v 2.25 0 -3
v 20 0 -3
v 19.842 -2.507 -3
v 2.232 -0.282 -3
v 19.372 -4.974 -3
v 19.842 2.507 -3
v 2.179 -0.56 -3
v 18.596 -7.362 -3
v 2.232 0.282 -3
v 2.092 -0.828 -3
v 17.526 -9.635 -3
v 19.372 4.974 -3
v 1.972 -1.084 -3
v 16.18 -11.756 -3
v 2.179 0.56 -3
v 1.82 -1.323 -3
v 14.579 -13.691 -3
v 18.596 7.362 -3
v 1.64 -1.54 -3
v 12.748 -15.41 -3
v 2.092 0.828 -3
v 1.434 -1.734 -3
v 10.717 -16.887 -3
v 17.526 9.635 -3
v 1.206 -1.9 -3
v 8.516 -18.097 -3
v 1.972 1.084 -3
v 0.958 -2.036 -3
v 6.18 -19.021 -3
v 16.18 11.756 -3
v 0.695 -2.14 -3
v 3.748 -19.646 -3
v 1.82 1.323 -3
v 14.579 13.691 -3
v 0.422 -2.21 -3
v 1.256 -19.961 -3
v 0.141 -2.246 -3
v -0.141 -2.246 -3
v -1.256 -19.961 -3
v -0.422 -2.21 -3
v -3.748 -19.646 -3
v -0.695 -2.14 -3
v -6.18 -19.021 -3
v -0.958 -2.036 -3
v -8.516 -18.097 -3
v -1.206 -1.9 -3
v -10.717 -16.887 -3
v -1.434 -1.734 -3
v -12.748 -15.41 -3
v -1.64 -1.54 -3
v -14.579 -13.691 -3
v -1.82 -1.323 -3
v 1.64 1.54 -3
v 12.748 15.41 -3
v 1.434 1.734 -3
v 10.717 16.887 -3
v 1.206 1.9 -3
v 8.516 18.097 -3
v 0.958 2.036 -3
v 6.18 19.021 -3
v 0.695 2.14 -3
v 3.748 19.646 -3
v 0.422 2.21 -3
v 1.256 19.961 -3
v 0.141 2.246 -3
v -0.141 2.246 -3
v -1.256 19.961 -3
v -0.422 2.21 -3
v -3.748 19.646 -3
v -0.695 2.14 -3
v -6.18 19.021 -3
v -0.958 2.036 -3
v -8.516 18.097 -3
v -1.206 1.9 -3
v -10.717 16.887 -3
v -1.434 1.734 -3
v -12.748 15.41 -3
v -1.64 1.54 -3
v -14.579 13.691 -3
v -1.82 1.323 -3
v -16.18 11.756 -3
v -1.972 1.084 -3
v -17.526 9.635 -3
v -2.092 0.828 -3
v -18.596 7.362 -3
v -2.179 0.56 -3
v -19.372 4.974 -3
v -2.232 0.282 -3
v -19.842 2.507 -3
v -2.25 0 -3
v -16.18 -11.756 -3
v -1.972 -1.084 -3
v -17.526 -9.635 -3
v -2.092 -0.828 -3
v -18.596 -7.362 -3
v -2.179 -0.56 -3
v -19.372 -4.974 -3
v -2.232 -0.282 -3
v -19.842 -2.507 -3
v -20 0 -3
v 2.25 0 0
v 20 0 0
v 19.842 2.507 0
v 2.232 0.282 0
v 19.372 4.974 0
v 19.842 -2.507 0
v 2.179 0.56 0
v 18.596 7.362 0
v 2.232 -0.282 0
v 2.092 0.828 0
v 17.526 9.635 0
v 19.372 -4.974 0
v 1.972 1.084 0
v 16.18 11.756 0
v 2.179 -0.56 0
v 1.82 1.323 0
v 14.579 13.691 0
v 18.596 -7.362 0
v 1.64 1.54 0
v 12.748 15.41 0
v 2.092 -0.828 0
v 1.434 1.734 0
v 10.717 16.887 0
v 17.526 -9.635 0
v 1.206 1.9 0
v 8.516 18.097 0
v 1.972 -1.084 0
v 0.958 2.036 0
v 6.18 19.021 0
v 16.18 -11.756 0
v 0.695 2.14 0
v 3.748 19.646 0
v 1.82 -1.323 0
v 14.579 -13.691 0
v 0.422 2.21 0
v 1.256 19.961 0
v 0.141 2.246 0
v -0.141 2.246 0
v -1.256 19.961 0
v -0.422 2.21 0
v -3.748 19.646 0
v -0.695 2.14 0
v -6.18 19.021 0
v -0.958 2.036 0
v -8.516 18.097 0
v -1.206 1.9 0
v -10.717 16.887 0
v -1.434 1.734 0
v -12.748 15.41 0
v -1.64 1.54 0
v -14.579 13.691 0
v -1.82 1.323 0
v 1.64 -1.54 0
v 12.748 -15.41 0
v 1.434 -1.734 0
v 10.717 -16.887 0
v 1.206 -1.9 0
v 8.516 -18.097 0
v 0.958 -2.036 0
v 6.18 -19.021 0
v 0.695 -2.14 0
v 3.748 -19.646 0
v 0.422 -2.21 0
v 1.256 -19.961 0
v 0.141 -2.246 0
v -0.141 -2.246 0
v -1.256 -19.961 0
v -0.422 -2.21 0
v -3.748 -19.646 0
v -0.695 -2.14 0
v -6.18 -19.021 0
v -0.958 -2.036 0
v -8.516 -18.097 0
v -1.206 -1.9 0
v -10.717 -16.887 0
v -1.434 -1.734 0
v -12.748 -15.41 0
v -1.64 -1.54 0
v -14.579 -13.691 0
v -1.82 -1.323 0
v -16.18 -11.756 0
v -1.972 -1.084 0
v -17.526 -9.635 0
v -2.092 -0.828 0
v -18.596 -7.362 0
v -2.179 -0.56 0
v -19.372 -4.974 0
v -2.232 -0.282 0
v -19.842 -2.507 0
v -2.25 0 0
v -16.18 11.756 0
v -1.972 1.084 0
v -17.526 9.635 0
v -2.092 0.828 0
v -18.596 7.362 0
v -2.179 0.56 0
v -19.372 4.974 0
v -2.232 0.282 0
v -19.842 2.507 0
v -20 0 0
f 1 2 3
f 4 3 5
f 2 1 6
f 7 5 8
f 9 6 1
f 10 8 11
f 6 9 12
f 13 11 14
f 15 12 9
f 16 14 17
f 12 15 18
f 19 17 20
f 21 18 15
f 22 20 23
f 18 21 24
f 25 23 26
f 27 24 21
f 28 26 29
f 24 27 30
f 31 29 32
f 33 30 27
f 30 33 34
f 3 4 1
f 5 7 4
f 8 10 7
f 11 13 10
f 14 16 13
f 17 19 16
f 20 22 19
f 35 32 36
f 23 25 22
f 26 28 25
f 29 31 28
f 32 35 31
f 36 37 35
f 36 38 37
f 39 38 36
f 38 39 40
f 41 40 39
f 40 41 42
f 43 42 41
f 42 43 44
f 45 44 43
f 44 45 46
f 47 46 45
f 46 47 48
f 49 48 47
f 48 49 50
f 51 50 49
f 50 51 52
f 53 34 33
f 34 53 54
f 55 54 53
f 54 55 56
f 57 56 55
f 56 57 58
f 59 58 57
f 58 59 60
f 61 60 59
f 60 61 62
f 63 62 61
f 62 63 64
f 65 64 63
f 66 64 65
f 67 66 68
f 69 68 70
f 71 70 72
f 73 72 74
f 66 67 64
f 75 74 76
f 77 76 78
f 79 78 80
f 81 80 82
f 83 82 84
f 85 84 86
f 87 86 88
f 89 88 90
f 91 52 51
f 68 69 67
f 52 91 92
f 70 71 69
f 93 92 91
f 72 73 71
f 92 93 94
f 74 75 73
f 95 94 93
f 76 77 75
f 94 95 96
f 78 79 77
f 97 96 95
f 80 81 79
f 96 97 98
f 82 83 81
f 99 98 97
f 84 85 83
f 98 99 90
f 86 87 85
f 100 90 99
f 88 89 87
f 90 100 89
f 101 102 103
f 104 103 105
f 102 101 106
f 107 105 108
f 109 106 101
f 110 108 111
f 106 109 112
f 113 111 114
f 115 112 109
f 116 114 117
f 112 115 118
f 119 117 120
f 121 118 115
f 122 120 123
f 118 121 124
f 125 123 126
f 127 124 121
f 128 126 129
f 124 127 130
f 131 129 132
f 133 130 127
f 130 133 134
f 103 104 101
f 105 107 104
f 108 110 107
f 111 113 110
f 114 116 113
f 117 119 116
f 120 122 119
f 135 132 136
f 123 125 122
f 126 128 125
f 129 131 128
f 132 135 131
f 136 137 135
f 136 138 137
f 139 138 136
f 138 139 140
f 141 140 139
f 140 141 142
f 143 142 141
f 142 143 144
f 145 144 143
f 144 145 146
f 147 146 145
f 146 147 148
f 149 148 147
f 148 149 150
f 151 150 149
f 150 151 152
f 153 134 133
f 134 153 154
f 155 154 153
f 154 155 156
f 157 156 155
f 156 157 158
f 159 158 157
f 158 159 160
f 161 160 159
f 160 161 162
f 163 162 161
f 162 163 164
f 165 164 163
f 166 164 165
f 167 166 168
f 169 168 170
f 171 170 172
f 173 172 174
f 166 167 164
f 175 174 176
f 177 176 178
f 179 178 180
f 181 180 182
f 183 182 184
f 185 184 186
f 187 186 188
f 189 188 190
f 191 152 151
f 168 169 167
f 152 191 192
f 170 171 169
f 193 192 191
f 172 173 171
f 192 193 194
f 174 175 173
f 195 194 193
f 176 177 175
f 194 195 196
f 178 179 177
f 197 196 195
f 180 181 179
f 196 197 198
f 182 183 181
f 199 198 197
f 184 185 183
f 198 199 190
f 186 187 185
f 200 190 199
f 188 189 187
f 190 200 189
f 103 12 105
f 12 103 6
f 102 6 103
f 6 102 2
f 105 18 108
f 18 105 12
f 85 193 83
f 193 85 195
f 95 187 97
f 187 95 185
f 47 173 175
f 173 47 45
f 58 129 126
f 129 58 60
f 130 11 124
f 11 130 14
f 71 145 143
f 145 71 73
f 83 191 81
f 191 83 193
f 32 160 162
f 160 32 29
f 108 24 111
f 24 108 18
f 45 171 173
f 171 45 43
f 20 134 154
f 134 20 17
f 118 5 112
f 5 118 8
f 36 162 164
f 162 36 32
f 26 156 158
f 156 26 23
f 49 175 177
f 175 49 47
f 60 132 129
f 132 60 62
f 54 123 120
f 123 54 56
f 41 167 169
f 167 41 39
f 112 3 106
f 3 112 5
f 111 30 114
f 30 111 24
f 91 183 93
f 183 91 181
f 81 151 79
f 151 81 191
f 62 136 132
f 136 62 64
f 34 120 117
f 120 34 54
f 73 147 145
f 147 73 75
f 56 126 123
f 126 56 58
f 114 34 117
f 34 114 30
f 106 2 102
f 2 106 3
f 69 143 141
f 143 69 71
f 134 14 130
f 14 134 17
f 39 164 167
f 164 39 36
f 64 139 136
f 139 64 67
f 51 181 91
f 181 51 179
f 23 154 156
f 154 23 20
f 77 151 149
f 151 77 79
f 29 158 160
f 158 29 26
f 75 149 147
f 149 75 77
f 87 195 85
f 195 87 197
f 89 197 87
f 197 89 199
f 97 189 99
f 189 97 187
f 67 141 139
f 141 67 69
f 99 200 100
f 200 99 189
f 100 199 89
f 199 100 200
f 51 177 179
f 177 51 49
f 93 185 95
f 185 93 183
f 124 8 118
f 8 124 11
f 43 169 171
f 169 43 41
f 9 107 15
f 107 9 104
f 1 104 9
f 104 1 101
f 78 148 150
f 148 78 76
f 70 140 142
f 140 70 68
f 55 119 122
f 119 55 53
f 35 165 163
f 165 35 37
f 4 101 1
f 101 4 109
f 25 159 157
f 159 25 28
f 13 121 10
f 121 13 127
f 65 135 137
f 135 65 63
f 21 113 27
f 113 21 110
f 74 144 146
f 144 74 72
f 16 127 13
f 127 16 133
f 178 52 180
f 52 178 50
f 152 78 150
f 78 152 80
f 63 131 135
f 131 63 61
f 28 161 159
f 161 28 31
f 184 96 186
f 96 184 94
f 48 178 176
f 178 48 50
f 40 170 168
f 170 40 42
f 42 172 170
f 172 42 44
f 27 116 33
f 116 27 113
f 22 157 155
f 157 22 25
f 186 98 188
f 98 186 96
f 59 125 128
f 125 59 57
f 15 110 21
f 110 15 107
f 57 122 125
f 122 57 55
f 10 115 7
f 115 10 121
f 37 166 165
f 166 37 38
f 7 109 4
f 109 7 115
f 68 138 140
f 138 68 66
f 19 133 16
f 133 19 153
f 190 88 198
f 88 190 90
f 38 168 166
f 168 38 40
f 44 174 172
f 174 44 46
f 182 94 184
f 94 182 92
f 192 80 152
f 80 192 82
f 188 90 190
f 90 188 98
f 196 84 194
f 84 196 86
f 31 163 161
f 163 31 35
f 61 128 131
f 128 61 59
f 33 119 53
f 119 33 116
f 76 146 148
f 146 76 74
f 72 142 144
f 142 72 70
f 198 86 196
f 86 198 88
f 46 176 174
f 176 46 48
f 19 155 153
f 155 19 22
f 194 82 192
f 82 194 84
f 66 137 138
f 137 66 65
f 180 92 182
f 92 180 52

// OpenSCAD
$fn = 50;


difference() {
	union() {
		translate(v = [0, 0, -3.0000000000]) {
			cylinder(h = 3, r = 10.0000000000);
		}
		translate(v = [0, 0, -3.0000000000]) {
			cylinder(h = 3, r = 20.0000000000);
		}
	}
	union() {
		#translate(v = [0, 0, -3]) {
			cylinder(h = 3, r = 2.2500000000);
		}
	}
}
